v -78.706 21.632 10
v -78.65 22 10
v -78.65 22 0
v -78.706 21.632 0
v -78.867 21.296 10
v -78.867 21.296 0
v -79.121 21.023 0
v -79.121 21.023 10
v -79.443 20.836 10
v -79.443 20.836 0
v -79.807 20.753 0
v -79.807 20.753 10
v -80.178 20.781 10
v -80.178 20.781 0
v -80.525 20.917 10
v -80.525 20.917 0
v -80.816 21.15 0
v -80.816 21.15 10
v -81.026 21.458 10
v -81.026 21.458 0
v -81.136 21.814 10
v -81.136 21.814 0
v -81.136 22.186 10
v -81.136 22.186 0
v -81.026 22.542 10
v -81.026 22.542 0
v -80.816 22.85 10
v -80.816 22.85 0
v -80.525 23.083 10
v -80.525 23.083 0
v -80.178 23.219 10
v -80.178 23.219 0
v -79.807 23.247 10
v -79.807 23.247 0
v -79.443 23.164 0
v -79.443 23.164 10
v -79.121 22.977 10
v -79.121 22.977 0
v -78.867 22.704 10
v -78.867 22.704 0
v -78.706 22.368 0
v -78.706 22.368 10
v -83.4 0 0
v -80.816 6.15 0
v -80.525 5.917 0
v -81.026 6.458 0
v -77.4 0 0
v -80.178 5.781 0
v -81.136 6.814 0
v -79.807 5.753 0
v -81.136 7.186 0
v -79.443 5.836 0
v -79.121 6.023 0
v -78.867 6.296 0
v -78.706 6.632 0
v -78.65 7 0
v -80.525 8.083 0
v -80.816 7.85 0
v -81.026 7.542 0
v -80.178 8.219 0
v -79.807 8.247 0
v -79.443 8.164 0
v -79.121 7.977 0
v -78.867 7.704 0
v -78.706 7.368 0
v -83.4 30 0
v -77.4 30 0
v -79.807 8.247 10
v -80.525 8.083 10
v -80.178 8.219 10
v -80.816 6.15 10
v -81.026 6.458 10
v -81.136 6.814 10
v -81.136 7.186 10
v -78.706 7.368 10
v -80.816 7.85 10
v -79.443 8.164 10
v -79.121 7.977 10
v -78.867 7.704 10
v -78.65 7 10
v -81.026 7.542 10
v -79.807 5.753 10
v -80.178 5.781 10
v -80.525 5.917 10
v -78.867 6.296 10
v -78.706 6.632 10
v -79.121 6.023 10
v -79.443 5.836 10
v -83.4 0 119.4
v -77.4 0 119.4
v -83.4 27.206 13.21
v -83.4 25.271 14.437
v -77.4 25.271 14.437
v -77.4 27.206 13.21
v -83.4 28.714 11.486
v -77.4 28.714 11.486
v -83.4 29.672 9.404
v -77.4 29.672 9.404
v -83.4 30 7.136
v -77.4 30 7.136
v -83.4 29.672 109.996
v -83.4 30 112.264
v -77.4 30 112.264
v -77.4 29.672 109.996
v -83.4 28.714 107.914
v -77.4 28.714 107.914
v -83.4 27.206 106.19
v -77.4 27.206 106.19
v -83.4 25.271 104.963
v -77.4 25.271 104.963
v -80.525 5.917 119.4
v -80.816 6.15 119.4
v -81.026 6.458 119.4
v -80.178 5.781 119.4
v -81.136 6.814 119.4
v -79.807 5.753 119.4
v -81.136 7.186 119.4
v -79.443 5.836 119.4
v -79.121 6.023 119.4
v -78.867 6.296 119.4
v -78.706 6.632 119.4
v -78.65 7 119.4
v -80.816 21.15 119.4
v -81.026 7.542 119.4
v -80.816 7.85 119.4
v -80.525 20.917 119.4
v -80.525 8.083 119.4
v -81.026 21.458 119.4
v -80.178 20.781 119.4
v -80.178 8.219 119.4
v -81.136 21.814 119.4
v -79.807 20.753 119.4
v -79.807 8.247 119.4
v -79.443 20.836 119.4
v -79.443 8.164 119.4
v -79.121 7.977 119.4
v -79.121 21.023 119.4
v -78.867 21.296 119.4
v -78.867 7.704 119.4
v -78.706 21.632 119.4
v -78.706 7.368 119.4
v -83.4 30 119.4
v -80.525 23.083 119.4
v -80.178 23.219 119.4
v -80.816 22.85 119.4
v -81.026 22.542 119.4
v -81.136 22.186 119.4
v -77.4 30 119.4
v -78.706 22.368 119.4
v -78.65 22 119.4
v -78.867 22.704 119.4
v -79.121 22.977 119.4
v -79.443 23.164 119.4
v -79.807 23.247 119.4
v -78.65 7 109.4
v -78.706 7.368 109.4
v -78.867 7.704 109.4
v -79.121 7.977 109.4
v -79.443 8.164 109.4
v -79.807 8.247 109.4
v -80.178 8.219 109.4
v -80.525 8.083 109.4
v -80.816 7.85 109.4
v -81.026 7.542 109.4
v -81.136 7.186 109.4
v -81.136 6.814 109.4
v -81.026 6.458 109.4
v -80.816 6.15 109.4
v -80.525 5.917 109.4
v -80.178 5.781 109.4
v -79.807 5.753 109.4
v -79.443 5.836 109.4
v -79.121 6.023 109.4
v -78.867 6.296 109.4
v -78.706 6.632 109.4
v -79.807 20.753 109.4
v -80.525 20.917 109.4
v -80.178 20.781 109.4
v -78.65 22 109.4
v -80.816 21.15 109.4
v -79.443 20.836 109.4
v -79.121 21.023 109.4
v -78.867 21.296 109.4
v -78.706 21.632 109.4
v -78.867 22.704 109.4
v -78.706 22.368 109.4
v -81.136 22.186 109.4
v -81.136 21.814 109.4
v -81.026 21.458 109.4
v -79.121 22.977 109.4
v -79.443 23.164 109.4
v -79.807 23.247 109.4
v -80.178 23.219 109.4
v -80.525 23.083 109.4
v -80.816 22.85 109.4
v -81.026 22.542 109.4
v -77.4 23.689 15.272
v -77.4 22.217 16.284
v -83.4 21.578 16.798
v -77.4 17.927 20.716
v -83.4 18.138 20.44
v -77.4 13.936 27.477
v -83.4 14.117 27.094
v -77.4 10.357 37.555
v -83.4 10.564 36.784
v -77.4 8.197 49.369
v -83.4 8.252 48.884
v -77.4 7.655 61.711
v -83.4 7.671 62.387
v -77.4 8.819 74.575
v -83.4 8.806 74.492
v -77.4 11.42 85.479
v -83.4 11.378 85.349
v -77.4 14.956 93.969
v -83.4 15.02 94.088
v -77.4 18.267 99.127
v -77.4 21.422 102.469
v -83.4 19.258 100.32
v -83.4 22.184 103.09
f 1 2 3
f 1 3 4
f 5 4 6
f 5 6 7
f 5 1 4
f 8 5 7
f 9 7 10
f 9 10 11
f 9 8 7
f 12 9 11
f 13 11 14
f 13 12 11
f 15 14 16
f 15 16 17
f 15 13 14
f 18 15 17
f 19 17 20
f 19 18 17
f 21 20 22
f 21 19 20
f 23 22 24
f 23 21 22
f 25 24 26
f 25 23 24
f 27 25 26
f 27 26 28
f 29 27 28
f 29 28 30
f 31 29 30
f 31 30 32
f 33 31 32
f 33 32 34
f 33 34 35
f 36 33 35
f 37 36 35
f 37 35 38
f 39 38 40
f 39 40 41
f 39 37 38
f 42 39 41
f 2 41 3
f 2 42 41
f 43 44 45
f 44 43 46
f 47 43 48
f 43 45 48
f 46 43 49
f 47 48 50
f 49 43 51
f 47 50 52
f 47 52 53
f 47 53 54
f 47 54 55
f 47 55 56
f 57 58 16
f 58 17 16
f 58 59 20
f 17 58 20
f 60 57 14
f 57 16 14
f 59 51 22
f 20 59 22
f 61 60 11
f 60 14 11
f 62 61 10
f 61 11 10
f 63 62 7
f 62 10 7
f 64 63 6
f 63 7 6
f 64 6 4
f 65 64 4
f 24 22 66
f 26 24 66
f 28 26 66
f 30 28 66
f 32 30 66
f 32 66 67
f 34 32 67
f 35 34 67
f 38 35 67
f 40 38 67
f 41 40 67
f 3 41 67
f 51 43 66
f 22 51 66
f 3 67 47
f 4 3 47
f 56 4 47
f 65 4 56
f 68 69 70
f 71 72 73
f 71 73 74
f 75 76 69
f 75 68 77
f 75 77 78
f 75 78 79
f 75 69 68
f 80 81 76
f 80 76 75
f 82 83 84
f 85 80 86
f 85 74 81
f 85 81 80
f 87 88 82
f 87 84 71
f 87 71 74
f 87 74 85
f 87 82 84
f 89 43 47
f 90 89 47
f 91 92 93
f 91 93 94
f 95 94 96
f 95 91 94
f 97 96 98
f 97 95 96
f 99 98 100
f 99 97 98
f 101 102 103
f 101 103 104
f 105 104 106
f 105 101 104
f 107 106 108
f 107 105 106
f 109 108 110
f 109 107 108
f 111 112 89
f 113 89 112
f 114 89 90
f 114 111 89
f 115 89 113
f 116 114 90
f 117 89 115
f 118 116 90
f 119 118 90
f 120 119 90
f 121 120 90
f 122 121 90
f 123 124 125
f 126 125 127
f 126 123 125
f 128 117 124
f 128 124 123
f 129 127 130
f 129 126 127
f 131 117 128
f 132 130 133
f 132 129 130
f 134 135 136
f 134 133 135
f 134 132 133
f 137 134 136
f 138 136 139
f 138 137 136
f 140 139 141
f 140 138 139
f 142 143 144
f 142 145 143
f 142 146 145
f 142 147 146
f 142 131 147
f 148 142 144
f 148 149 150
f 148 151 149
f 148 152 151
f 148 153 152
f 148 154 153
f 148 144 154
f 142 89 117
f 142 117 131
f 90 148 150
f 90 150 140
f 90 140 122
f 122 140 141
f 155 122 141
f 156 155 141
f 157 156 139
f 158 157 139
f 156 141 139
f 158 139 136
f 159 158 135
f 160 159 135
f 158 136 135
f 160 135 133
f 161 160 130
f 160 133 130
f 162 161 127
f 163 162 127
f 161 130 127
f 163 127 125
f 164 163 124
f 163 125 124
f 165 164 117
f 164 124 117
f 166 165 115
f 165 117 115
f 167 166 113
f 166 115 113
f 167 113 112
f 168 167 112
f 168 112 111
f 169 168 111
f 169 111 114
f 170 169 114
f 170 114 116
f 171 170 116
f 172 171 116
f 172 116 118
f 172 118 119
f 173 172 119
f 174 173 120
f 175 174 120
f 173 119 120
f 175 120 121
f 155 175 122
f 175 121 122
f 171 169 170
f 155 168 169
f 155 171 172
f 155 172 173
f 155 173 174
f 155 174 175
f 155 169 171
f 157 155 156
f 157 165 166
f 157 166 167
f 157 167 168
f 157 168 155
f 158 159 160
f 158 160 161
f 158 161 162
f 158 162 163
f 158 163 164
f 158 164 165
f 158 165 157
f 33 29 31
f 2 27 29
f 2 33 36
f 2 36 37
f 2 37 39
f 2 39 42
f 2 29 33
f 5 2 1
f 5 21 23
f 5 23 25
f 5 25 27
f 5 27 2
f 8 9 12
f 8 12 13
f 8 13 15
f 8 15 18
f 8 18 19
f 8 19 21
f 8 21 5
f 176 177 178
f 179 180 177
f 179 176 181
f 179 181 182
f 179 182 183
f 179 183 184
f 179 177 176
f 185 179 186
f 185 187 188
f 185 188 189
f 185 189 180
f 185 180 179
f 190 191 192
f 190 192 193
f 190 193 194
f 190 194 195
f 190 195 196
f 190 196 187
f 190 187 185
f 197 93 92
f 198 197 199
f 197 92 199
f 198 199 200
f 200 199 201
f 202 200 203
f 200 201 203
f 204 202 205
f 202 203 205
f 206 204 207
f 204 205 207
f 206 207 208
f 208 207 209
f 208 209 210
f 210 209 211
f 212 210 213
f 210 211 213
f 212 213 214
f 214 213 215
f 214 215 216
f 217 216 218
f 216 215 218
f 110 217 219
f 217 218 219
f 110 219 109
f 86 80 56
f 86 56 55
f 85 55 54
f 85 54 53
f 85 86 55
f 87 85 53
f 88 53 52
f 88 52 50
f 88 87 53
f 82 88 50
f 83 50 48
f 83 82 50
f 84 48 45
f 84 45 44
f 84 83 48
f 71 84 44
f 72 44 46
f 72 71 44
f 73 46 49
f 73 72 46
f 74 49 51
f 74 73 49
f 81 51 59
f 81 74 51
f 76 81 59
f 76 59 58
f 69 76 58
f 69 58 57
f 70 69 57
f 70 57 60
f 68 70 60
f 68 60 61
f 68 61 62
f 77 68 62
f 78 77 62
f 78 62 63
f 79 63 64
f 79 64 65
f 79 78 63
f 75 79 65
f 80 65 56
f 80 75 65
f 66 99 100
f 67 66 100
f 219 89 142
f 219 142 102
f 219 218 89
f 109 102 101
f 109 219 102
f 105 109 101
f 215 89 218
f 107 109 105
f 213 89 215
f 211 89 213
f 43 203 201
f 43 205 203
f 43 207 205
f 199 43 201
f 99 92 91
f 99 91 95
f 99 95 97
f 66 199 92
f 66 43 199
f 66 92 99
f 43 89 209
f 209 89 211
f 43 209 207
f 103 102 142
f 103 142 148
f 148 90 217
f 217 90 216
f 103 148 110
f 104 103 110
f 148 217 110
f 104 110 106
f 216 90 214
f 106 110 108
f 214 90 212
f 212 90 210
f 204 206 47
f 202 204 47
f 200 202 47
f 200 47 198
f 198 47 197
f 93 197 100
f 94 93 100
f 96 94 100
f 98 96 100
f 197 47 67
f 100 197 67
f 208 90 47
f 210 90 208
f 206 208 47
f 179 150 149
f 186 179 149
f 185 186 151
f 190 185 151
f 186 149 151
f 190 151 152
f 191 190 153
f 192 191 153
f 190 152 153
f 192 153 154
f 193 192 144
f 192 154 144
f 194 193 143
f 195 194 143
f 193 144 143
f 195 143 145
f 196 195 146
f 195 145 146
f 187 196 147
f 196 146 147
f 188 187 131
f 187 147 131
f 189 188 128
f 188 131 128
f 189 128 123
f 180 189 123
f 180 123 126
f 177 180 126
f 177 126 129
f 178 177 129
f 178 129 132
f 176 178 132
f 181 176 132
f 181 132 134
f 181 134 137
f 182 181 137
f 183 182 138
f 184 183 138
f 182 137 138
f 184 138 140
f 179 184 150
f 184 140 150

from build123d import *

# Parameters (mm, degrees)
SKETCH_3_W          = 6
SKETCH_3_H          = 30
EXTRUDE_1_DEPTH     = 119.4
SKETCH_4_RX         = 46.310154036
SKETCH_4_RY         = 22.366189945
CUT_EXTRUDE_1_DEPTH = 124.257291874
FILLET_START        = -84
FILLET_1_DEPTH      = 8
SKETCH_5_R          = 1.25
CUT_EXTRUDE_2_DEPTH = 10
CUT_EXTRUDE_START   = -10
SKETCH_6_R          = 1.25
CUT_EXTRUDE_3_DEPTH = 10


with BuildPart() as part:
    # 草图3 → 凸台-拉伸1 (new body)
    with BuildSketch(Plane.XY):
        with Locations((-80.4, 15)):
            Rectangle(SKETCH_3_W, SKETCH_3_H)
    extrude(amount=EXTRUDE_1_DEPTH)

    # 草图4 → 切除-拉伸1 (cut, through all)
    with BuildSketch(Plane.ZY.offset(83.4)):
        with Locations((59.7, 30)):
            Ellipse(SKETCH_4_RX, SKETCH_4_RY)
    extrude(amount=-CUT_EXTRUDE_1_DEPTH, mode=Mode.SUBTRACT)

    # 圆角1: read off the stored shape, not the designer's step
    # 圆角1 outline → 圆角1 (cut)
    with BuildSketch(Plane.YZ.offset(FILLET_START)):
        with BuildLine():
            Line((30, 106.010154036), (30, 112.263898035))
            ThreePointArc((30, 112.263898035), (28.714319891, 107.914425838), (25.270522901, 104.962961112))
            add(Edge.make_bspline(
                [(25.270522901, 104.962961112), (27.608219262, 106.010154036), (30, 106.010154036)],
                knots=[6.05570643, 6.05570643, 6.05570643, 6.283185307, 6.283185307, 6.283185307], degree=2, weights=[0.927453028, 0.957583921, 1]))
        make_face()
        with BuildLine():
            add(Edge.make_bspline(
                [(30, 13.389845964), (27.608219262, 13.389845964), (25.270522901, 14.437038888)],
                knots=[3.141592654, 3.141592654, 3.141592654, 3.369071531, 3.369071531, 3.369071531], degree=2, weights=[1, 0.957583921, 0.927453028]))
            ThreePointArc((25.270522901, 14.437038888), (28.714319891, 11.485574162), (30, 7.136101965))
            Line((30, 7.136101965), (30, 13.389845964))
        make_face()
    extrude(amount=FILLET_1_DEPTH, mode=Mode.SUBTRACT)

    # 草图5 → 切除-拉伸2 (cut)
    with BuildSketch(Plane.XY.offset(119.4)):
        with Locations((-79.9, 22)):
            Circle(SKETCH_5_R)
        with Locations((-79.9, 7)):
            Circle(SKETCH_5_R)
    extrude(amount=-CUT_EXTRUDE_2_DEPTH, mode=Mode.SUBTRACT)

    # 草图6 → 切除-拉伸3 (cut)
    with BuildSketch(Plane(origin=(0, 0, 0), x_dir=(-1, 0, 0), z_dir=(0, 0, -1)).offset(CUT_EXTRUDE_START)):
        with Locations(Location((79.9, 22, 0), (0, 0, 180))):
            Circle(SKETCH_6_R)
        with Locations(Location((79.9, 7, 0), (0, 0, 180))):
            Circle(SKETCH_6_R)
    extrude(amount=CUT_EXTRUDE_3_DEPTH, mode=Mode.SUBTRACT)


solid = part.part
